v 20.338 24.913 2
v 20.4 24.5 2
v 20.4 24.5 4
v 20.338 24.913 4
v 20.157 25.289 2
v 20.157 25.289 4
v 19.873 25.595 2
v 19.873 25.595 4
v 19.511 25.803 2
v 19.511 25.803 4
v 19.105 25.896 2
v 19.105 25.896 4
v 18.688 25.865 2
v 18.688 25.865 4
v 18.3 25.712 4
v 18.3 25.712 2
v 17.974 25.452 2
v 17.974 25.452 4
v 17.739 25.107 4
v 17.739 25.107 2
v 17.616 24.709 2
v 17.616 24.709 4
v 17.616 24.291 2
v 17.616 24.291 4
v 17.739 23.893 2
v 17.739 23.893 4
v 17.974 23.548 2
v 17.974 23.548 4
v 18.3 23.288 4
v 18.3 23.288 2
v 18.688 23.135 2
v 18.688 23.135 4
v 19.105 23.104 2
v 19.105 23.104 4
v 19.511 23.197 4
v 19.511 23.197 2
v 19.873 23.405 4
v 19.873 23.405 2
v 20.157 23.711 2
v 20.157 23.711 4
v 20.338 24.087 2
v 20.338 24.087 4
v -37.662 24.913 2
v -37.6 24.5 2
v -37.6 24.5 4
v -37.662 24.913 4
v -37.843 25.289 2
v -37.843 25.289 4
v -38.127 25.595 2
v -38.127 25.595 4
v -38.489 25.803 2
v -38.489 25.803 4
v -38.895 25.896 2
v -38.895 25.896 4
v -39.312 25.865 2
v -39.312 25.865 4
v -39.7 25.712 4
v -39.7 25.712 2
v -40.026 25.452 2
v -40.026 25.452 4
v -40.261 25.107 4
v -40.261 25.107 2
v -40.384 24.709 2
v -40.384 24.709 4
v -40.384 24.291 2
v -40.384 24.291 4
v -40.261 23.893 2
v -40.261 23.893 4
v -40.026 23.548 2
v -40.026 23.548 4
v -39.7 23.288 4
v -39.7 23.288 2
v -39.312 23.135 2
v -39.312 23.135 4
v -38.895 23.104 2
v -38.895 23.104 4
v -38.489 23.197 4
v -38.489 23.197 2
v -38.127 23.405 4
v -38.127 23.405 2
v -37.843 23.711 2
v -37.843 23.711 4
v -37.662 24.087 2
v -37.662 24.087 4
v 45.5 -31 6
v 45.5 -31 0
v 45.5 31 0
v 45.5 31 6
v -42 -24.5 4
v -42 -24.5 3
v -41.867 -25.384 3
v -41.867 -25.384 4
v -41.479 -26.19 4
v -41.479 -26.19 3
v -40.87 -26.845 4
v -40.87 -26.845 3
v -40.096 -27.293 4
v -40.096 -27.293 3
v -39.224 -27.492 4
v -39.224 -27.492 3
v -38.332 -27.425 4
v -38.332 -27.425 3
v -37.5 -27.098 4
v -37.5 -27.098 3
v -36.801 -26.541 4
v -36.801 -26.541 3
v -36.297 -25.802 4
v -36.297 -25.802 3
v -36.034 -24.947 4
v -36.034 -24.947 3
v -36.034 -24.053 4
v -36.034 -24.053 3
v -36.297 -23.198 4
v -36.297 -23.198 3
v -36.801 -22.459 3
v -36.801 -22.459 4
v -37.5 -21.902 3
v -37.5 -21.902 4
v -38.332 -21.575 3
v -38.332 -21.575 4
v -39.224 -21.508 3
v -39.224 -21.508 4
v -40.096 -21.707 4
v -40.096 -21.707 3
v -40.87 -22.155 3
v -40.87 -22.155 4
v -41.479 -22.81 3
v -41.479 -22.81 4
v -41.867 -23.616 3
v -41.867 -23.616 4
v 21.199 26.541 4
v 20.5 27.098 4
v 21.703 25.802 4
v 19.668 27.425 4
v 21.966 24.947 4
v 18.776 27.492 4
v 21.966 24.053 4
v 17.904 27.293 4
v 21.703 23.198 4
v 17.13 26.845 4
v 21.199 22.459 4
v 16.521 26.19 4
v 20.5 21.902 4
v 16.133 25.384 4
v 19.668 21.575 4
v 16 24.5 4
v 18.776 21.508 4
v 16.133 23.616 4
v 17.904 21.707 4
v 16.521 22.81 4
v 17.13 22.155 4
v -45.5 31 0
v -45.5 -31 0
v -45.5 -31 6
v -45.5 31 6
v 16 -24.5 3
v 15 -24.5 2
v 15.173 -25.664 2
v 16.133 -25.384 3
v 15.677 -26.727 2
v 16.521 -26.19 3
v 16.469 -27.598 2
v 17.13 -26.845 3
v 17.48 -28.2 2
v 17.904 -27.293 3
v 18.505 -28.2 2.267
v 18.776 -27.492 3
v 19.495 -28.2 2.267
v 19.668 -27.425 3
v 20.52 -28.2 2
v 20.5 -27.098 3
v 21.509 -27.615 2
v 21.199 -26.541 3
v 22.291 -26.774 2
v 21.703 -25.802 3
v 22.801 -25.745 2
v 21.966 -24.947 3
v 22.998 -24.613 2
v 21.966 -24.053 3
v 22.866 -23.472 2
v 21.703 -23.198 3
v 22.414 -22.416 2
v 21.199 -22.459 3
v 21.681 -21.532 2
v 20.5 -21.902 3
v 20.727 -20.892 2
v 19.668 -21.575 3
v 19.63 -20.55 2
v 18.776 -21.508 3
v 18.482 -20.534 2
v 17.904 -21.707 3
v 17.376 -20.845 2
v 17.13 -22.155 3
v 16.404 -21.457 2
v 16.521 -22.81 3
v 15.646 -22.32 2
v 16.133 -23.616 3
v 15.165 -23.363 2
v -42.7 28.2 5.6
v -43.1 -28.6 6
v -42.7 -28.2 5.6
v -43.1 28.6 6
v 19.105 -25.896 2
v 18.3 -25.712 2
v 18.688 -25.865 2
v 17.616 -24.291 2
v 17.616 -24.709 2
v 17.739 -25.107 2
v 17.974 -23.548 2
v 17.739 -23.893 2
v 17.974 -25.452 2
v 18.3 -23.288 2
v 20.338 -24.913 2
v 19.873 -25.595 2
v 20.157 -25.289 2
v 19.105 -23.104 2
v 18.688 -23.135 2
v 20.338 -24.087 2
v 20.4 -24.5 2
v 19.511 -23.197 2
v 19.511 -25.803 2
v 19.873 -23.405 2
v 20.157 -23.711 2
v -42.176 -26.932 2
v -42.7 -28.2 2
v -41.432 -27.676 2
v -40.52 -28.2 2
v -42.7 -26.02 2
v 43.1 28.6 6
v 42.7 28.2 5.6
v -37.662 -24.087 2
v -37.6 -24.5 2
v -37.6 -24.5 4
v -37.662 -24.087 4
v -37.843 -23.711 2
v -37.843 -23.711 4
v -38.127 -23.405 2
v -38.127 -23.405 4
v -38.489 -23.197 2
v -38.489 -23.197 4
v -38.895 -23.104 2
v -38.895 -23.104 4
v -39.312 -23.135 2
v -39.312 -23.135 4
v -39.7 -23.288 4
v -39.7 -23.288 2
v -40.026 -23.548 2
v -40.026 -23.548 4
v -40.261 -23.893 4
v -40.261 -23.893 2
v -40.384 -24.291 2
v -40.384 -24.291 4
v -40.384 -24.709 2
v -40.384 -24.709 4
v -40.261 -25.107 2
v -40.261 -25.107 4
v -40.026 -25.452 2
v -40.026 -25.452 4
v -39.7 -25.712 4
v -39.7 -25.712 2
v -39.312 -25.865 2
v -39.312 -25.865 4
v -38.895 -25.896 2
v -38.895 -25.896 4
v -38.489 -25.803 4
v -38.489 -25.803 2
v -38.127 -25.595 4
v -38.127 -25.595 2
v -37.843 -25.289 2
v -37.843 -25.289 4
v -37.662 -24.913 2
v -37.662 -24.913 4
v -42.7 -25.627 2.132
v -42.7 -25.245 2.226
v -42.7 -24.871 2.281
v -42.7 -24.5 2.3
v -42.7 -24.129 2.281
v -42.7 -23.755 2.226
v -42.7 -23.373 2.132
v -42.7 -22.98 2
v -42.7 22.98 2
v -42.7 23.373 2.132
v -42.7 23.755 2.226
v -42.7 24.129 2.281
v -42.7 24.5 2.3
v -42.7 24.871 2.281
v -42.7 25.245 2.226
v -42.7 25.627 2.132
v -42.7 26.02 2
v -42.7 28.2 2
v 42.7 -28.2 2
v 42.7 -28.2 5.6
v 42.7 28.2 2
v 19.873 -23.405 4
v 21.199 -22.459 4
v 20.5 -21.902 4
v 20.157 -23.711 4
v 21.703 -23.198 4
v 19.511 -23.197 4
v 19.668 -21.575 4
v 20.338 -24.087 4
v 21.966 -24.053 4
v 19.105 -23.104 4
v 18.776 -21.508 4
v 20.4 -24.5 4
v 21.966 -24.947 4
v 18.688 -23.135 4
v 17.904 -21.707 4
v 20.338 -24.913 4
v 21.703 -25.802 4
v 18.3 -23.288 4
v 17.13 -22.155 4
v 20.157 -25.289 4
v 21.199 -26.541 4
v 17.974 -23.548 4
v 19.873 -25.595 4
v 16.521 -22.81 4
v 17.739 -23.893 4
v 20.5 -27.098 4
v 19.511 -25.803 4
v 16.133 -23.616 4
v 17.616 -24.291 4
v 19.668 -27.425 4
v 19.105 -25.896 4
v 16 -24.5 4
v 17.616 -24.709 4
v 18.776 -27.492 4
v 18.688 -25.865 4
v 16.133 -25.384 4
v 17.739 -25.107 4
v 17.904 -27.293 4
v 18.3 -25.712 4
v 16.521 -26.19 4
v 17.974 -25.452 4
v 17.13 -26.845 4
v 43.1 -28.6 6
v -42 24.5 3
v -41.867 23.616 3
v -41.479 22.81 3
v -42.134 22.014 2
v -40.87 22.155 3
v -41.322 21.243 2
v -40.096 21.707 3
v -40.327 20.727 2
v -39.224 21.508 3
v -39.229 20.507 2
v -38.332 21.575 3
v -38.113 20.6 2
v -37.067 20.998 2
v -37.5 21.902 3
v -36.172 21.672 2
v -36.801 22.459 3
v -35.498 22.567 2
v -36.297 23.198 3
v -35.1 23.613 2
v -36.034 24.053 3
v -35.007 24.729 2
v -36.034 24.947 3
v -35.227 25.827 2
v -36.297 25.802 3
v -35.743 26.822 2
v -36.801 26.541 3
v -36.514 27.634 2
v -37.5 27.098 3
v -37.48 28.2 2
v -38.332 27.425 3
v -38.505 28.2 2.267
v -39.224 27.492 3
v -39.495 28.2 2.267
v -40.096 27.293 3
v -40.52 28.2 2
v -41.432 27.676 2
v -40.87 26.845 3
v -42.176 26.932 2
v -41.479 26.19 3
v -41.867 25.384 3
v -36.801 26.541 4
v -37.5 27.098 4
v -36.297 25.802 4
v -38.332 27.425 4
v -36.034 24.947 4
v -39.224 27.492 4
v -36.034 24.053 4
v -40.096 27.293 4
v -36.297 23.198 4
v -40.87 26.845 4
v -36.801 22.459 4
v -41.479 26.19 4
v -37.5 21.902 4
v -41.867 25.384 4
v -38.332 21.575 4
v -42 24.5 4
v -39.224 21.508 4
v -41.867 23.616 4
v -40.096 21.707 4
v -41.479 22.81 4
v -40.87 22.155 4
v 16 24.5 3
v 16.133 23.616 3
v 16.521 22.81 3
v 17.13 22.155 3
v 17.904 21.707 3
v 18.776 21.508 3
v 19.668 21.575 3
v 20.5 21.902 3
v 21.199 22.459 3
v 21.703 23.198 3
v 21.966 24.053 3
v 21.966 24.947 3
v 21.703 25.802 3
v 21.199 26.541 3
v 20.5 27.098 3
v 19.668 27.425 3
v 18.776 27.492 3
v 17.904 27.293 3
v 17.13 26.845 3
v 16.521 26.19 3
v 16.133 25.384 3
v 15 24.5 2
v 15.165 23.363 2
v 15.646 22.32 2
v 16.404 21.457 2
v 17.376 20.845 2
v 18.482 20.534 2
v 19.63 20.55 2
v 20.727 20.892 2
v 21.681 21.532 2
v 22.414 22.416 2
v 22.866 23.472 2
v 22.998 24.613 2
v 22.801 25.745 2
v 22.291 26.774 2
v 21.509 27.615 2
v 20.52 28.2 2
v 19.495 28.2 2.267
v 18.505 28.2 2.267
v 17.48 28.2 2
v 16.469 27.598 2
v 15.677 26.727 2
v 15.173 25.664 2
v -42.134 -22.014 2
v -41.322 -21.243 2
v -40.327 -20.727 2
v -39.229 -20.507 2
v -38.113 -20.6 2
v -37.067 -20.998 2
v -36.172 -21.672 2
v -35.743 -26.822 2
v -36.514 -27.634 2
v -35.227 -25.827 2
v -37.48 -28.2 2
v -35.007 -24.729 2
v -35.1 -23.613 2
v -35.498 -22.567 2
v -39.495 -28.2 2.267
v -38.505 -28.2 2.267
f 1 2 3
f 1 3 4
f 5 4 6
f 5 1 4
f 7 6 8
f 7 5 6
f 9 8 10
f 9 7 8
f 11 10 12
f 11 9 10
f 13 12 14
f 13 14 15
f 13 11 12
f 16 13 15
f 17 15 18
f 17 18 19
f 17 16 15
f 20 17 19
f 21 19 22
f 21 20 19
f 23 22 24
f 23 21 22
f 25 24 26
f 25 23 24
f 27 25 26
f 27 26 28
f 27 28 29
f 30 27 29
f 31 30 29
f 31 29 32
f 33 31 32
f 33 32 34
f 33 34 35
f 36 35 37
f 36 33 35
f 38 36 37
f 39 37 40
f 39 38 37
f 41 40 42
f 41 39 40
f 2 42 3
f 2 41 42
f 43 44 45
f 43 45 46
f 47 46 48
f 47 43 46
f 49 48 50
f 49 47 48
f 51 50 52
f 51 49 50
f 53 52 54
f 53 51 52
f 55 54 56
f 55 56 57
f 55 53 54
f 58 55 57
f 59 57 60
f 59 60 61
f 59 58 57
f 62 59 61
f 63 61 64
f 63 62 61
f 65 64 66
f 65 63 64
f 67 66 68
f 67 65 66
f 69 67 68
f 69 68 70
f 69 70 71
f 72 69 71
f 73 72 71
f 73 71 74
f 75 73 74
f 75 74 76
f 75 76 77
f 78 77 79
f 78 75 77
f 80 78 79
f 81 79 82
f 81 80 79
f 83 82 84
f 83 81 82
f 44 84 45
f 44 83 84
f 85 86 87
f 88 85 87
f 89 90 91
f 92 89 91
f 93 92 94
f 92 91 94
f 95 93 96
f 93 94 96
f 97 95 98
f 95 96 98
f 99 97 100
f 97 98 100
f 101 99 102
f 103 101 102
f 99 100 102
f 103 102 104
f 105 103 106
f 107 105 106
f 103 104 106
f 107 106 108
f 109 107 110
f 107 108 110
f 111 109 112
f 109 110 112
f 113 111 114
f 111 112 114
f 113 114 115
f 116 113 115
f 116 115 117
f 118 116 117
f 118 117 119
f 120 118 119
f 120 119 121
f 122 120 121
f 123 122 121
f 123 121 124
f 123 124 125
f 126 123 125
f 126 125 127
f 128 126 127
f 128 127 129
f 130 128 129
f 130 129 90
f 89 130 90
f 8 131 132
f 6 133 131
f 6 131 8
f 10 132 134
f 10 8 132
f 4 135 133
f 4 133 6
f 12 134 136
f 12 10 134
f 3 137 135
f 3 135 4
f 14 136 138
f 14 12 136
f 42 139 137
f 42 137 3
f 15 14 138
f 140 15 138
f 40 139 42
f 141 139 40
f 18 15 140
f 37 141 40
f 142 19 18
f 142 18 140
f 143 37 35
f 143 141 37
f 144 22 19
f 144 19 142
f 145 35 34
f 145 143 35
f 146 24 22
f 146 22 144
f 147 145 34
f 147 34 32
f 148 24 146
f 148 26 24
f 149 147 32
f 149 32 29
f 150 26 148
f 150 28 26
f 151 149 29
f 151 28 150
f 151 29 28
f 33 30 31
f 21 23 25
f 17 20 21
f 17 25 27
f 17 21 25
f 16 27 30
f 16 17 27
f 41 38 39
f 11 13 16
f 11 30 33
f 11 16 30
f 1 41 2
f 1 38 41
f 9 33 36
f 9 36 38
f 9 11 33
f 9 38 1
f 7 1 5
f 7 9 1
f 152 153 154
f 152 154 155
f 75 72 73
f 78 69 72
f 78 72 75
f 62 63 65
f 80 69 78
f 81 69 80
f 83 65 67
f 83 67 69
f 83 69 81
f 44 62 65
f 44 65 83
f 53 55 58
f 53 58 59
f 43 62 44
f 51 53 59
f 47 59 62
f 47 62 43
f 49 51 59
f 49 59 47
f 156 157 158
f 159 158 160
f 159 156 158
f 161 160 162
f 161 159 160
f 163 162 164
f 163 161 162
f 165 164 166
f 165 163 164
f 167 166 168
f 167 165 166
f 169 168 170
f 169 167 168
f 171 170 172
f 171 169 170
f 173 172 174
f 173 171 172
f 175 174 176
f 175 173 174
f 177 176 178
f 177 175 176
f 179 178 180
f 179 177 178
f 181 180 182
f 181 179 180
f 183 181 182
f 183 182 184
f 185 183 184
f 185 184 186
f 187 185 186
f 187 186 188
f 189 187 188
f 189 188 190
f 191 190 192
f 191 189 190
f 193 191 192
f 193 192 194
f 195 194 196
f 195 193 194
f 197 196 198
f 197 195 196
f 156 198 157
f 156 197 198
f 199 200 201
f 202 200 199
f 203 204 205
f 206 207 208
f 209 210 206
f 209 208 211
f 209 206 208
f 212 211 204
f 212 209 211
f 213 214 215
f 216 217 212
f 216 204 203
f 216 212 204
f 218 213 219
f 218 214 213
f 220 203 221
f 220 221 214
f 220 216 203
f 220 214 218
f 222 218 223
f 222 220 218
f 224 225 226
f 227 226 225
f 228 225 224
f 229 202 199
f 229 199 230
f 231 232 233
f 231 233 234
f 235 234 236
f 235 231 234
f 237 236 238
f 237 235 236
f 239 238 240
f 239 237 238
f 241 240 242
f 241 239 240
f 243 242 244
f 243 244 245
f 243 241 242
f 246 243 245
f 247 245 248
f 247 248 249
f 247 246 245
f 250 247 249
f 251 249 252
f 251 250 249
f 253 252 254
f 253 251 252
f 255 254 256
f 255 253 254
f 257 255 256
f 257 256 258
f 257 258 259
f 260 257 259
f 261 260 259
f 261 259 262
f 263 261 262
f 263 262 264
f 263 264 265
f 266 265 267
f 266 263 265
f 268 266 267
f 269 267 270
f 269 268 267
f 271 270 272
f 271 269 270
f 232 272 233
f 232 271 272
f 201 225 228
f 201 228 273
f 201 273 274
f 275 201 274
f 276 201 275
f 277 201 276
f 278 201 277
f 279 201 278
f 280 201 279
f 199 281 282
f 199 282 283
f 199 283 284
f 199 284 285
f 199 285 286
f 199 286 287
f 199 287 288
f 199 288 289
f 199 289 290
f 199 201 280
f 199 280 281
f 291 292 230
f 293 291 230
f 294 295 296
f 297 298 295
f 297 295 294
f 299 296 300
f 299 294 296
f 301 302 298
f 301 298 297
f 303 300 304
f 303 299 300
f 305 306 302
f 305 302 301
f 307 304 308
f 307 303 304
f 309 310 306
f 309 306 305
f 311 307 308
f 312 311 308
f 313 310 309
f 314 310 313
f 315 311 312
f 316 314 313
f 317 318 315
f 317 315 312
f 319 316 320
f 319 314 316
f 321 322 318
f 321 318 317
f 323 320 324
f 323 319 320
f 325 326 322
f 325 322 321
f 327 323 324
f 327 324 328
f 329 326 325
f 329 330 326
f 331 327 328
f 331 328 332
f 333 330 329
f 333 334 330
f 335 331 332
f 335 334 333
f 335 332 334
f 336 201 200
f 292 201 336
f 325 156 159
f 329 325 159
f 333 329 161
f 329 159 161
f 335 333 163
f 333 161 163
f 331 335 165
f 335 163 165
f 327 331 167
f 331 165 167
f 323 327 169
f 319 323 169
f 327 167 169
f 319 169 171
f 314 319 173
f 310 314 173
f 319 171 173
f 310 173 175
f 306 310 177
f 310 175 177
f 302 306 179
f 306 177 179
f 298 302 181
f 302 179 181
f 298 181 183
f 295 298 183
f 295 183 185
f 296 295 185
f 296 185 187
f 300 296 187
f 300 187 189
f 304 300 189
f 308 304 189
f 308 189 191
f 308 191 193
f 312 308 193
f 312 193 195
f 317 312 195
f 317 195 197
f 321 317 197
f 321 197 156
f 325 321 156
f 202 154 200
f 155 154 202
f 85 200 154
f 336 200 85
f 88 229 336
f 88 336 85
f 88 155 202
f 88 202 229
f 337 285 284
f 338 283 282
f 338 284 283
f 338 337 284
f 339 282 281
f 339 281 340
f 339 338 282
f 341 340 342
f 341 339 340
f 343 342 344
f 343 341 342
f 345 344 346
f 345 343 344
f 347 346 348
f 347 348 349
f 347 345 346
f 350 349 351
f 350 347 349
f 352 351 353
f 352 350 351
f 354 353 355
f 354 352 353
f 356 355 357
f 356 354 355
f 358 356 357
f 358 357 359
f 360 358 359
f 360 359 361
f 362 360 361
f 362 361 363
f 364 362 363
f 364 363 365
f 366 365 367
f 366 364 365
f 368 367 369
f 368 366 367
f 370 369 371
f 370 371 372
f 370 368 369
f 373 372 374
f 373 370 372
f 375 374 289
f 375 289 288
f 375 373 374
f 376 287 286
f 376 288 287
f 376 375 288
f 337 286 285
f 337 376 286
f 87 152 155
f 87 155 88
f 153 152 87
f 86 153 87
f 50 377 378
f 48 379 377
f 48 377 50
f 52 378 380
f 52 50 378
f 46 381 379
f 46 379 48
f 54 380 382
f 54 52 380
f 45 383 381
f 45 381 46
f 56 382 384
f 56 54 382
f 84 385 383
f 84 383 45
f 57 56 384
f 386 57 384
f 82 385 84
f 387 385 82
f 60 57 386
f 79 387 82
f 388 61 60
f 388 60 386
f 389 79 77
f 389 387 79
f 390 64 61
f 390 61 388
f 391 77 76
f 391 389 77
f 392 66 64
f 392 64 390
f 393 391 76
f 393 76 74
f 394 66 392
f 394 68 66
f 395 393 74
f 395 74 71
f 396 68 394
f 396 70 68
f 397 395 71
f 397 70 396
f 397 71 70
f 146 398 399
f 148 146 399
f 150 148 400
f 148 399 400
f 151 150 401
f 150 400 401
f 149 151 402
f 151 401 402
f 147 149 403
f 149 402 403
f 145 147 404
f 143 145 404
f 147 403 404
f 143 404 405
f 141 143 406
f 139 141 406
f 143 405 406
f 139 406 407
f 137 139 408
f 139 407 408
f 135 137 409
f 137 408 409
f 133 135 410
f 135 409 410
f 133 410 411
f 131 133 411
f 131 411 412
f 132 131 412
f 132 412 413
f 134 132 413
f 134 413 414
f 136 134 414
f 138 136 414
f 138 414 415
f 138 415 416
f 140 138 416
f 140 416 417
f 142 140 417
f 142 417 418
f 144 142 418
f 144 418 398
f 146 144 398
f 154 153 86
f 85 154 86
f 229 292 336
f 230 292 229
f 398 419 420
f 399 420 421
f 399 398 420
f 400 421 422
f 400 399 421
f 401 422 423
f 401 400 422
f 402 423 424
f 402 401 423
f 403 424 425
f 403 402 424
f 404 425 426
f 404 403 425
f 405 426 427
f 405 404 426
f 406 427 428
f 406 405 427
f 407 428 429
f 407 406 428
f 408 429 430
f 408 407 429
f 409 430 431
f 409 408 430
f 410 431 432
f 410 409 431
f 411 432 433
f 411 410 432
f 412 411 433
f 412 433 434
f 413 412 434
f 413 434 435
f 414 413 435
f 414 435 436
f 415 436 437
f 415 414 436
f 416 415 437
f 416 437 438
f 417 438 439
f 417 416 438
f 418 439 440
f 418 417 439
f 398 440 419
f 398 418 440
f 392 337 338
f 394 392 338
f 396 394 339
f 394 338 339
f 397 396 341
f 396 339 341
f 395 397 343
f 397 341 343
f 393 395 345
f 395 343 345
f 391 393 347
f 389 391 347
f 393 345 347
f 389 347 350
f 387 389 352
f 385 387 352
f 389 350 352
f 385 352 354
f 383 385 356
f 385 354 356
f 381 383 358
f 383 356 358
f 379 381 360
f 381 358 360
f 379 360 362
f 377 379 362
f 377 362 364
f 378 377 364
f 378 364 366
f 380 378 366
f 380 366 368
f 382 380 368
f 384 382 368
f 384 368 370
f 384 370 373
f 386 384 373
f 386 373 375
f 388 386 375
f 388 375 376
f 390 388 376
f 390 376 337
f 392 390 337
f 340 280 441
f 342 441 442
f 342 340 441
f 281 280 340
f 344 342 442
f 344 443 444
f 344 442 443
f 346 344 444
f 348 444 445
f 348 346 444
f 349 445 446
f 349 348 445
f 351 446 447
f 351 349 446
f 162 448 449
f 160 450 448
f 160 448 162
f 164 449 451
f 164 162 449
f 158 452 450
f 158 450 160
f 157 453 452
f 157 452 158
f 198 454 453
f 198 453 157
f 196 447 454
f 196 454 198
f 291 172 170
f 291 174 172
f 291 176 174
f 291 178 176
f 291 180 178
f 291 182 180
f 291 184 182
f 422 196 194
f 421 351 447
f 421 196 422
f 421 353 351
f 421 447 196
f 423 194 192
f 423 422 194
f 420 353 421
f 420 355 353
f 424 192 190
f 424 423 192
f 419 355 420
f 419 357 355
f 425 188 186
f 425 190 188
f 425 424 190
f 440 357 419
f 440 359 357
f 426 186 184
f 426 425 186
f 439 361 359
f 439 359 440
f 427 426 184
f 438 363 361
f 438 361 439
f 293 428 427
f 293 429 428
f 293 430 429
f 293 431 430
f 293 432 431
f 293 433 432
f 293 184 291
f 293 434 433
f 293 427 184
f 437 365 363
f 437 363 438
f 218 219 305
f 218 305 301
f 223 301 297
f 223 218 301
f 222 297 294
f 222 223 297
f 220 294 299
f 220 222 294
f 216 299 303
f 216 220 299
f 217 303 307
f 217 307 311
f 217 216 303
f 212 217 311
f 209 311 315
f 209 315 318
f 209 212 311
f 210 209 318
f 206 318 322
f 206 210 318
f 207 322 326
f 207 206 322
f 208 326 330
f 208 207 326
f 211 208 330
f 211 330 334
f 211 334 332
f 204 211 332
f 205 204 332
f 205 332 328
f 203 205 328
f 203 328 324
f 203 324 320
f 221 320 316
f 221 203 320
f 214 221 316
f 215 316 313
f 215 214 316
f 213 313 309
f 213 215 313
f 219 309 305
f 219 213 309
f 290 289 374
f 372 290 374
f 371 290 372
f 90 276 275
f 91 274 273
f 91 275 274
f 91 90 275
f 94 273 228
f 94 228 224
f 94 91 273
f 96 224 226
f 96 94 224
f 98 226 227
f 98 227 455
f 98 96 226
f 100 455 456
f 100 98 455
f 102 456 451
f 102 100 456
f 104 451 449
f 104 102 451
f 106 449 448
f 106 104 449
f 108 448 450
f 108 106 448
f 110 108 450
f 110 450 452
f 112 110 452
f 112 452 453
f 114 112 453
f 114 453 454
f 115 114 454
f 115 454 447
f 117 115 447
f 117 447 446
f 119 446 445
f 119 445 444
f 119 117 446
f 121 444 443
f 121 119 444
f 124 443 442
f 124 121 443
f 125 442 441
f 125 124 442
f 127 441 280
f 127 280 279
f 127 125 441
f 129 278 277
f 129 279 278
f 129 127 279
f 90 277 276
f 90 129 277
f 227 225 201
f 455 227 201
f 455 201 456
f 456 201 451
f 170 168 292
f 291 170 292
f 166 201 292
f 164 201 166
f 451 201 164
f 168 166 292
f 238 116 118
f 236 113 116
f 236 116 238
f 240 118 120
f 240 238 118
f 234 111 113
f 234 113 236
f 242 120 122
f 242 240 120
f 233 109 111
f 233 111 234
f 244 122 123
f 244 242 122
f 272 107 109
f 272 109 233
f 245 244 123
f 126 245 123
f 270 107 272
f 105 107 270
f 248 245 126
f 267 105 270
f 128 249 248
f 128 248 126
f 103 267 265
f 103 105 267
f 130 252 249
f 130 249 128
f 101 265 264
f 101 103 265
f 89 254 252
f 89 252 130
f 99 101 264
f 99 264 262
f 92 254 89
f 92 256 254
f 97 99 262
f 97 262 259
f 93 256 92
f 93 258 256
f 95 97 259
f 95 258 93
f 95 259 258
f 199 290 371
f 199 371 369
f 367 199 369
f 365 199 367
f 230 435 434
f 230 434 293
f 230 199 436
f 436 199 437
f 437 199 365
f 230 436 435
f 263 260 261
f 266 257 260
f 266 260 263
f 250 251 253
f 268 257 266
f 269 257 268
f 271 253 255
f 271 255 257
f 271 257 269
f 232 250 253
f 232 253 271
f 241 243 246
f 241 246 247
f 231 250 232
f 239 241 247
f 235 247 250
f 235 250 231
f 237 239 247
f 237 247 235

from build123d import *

# Parameters (mm, degrees)
SKETCH1_W                  = 91
SKETCH1_H                  = 62
BOSS_EXTRUDE1_DEPTH        = 6
SKETCH2_W                  = 85.4
SKETCH2_H                  = 56.4
CUT_EXTRUDE1_DEPTH         = 4
SKETCH3_R                  = 3
SKETCH3_R_2                = 1.4
BOSS_EXTRUDE2_DEPTH        = 2
CHAMFER1_SIZE              = 1
CHAMFER2_SIZE              = 0.4
LPATTERN1_COUNT            = 2
LPATTERN1_PITCH            = 58
LPATTERN1_COUNT_DIR2       = 2
LPATTERN1_PITCH_DIR2       = 49
CHAMFER1_OF_LPATTERN1_SIZE = 1


with BuildPart() as part:
    # Sketch1 → Boss-Extrude1 (new body)
    with BuildSketch(Plane.XY):
        Rectangle(SKETCH1_W, SKETCH1_H)
    extrude(amount=BOSS_EXTRUDE1_DEPTH)

    # Sketch2 → Cut-Extrude1 (cut)
    with BuildSketch(Plane.XY.offset(6)):
        Rectangle(SKETCH2_W, SKETCH2_H)
    extrude(amount=-CUT_EXTRUDE1_DEPTH, mode=Mode.SUBTRACT)

    # Sketch3 → Boss-Extrude2 (add)
    with BuildSketch(Plane.XY.offset(2)):
        with Locations(Location((-39, 24.5, 0), (0, 0, 180))):
            Circle(SKETCH3_R)
        with Locations((-39, 24.5)):
            Circle(SKETCH3_R_2, mode=Mode.SUBTRACT)
    boss_extrude2 = extrude(amount=BOSS_EXTRUDE2_DEPTH)

    # Chamfer1
    # the kernel refuses this chamfer: 1 mm, written as the material it adds along each edge
    with BuildSketch(Plane(origin=(-39, 24.5, 2), x_dir=(-1, 0, 0), z_dir=(0, 1, 0))) as chamfer1_piece_1:
        Polygon((3 + CHAMFER1_SIZE, 0), (3, CHAMFER1_SIZE), (3, 0), align=None)
    revolve(axis=Axis((-39, 24.5, 2), (0, 0, 1)))

    # Chamfer2
    chamfer2_edges = [part.edges().sort_by_distance(p)[0] for p in [
        (42.7, 0, 6),
        (0, 28.2, 6),
        (-42.7, 0, 6),
        (0, -28.2, 6),
    ]]
    chamfer(chamfer2_edges, length=CHAMFER2_SIZE)

    # LPattern1: Boss-Extrude2 2 × 2
    with Locations(*[(i * LPATTERN1_PITCH, -j * LPATTERN1_PITCH_DIR2, 0) for i in range(LPATTERN1_COUNT) for j in range(LPATTERN1_COUNT_DIR2) if (i, j) != (0, 0)]):
        add(boss_extrude2)

    # Chamfer1 of LPattern1
    # the kernel refuses this chamfer: 1 mm, written as the material it adds along each edge
    with BuildSketch(Plane(origin=(-39, -24.5, 2), x_dir=(-1, 0, 0), z_dir=(0, 1, 0))) as chamfer1_of_lpattern1_piece_1:
        Polygon((3 + CHAMFER1_OF_LPATTERN1_SIZE, 0), (3, CHAMFER1_OF_LPATTERN1_SIZE), (3, 0), align=None)
    revolve(axis=Axis((-39, -24.5, 2), (0, 0, 1)))
    with BuildSketch(Plane(origin=(19, 24.5, 2), x_dir=(-1, 0, 0), z_dir=(0, 1, 0))) as chamfer1_of_lpattern1_piece_2:
        Polygon((3 + CHAMFER1_OF_LPATTERN1_SIZE, 0), (3, CHAMFER1_OF_LPATTERN1_SIZE), (3, 0), align=None)
    revolve(axis=Axis((19, 24.5, 2), (0, 0, 1)))
    with BuildSketch(Plane(origin=(19, -24.5, 2), x_dir=(-1, 0, 0), z_dir=(0, 1, 0))) as chamfer1_of_lpattern1_piece_3:
        Polygon((3 + CHAMFER1_OF_LPATTERN1_SIZE, 0), (3, CHAMFER1_OF_LPATTERN1_SIZE), (3, 0), align=None)
    revolve(axis=Axis((19, -24.5, 2), (0, 0, 1)))


solid = part.part
